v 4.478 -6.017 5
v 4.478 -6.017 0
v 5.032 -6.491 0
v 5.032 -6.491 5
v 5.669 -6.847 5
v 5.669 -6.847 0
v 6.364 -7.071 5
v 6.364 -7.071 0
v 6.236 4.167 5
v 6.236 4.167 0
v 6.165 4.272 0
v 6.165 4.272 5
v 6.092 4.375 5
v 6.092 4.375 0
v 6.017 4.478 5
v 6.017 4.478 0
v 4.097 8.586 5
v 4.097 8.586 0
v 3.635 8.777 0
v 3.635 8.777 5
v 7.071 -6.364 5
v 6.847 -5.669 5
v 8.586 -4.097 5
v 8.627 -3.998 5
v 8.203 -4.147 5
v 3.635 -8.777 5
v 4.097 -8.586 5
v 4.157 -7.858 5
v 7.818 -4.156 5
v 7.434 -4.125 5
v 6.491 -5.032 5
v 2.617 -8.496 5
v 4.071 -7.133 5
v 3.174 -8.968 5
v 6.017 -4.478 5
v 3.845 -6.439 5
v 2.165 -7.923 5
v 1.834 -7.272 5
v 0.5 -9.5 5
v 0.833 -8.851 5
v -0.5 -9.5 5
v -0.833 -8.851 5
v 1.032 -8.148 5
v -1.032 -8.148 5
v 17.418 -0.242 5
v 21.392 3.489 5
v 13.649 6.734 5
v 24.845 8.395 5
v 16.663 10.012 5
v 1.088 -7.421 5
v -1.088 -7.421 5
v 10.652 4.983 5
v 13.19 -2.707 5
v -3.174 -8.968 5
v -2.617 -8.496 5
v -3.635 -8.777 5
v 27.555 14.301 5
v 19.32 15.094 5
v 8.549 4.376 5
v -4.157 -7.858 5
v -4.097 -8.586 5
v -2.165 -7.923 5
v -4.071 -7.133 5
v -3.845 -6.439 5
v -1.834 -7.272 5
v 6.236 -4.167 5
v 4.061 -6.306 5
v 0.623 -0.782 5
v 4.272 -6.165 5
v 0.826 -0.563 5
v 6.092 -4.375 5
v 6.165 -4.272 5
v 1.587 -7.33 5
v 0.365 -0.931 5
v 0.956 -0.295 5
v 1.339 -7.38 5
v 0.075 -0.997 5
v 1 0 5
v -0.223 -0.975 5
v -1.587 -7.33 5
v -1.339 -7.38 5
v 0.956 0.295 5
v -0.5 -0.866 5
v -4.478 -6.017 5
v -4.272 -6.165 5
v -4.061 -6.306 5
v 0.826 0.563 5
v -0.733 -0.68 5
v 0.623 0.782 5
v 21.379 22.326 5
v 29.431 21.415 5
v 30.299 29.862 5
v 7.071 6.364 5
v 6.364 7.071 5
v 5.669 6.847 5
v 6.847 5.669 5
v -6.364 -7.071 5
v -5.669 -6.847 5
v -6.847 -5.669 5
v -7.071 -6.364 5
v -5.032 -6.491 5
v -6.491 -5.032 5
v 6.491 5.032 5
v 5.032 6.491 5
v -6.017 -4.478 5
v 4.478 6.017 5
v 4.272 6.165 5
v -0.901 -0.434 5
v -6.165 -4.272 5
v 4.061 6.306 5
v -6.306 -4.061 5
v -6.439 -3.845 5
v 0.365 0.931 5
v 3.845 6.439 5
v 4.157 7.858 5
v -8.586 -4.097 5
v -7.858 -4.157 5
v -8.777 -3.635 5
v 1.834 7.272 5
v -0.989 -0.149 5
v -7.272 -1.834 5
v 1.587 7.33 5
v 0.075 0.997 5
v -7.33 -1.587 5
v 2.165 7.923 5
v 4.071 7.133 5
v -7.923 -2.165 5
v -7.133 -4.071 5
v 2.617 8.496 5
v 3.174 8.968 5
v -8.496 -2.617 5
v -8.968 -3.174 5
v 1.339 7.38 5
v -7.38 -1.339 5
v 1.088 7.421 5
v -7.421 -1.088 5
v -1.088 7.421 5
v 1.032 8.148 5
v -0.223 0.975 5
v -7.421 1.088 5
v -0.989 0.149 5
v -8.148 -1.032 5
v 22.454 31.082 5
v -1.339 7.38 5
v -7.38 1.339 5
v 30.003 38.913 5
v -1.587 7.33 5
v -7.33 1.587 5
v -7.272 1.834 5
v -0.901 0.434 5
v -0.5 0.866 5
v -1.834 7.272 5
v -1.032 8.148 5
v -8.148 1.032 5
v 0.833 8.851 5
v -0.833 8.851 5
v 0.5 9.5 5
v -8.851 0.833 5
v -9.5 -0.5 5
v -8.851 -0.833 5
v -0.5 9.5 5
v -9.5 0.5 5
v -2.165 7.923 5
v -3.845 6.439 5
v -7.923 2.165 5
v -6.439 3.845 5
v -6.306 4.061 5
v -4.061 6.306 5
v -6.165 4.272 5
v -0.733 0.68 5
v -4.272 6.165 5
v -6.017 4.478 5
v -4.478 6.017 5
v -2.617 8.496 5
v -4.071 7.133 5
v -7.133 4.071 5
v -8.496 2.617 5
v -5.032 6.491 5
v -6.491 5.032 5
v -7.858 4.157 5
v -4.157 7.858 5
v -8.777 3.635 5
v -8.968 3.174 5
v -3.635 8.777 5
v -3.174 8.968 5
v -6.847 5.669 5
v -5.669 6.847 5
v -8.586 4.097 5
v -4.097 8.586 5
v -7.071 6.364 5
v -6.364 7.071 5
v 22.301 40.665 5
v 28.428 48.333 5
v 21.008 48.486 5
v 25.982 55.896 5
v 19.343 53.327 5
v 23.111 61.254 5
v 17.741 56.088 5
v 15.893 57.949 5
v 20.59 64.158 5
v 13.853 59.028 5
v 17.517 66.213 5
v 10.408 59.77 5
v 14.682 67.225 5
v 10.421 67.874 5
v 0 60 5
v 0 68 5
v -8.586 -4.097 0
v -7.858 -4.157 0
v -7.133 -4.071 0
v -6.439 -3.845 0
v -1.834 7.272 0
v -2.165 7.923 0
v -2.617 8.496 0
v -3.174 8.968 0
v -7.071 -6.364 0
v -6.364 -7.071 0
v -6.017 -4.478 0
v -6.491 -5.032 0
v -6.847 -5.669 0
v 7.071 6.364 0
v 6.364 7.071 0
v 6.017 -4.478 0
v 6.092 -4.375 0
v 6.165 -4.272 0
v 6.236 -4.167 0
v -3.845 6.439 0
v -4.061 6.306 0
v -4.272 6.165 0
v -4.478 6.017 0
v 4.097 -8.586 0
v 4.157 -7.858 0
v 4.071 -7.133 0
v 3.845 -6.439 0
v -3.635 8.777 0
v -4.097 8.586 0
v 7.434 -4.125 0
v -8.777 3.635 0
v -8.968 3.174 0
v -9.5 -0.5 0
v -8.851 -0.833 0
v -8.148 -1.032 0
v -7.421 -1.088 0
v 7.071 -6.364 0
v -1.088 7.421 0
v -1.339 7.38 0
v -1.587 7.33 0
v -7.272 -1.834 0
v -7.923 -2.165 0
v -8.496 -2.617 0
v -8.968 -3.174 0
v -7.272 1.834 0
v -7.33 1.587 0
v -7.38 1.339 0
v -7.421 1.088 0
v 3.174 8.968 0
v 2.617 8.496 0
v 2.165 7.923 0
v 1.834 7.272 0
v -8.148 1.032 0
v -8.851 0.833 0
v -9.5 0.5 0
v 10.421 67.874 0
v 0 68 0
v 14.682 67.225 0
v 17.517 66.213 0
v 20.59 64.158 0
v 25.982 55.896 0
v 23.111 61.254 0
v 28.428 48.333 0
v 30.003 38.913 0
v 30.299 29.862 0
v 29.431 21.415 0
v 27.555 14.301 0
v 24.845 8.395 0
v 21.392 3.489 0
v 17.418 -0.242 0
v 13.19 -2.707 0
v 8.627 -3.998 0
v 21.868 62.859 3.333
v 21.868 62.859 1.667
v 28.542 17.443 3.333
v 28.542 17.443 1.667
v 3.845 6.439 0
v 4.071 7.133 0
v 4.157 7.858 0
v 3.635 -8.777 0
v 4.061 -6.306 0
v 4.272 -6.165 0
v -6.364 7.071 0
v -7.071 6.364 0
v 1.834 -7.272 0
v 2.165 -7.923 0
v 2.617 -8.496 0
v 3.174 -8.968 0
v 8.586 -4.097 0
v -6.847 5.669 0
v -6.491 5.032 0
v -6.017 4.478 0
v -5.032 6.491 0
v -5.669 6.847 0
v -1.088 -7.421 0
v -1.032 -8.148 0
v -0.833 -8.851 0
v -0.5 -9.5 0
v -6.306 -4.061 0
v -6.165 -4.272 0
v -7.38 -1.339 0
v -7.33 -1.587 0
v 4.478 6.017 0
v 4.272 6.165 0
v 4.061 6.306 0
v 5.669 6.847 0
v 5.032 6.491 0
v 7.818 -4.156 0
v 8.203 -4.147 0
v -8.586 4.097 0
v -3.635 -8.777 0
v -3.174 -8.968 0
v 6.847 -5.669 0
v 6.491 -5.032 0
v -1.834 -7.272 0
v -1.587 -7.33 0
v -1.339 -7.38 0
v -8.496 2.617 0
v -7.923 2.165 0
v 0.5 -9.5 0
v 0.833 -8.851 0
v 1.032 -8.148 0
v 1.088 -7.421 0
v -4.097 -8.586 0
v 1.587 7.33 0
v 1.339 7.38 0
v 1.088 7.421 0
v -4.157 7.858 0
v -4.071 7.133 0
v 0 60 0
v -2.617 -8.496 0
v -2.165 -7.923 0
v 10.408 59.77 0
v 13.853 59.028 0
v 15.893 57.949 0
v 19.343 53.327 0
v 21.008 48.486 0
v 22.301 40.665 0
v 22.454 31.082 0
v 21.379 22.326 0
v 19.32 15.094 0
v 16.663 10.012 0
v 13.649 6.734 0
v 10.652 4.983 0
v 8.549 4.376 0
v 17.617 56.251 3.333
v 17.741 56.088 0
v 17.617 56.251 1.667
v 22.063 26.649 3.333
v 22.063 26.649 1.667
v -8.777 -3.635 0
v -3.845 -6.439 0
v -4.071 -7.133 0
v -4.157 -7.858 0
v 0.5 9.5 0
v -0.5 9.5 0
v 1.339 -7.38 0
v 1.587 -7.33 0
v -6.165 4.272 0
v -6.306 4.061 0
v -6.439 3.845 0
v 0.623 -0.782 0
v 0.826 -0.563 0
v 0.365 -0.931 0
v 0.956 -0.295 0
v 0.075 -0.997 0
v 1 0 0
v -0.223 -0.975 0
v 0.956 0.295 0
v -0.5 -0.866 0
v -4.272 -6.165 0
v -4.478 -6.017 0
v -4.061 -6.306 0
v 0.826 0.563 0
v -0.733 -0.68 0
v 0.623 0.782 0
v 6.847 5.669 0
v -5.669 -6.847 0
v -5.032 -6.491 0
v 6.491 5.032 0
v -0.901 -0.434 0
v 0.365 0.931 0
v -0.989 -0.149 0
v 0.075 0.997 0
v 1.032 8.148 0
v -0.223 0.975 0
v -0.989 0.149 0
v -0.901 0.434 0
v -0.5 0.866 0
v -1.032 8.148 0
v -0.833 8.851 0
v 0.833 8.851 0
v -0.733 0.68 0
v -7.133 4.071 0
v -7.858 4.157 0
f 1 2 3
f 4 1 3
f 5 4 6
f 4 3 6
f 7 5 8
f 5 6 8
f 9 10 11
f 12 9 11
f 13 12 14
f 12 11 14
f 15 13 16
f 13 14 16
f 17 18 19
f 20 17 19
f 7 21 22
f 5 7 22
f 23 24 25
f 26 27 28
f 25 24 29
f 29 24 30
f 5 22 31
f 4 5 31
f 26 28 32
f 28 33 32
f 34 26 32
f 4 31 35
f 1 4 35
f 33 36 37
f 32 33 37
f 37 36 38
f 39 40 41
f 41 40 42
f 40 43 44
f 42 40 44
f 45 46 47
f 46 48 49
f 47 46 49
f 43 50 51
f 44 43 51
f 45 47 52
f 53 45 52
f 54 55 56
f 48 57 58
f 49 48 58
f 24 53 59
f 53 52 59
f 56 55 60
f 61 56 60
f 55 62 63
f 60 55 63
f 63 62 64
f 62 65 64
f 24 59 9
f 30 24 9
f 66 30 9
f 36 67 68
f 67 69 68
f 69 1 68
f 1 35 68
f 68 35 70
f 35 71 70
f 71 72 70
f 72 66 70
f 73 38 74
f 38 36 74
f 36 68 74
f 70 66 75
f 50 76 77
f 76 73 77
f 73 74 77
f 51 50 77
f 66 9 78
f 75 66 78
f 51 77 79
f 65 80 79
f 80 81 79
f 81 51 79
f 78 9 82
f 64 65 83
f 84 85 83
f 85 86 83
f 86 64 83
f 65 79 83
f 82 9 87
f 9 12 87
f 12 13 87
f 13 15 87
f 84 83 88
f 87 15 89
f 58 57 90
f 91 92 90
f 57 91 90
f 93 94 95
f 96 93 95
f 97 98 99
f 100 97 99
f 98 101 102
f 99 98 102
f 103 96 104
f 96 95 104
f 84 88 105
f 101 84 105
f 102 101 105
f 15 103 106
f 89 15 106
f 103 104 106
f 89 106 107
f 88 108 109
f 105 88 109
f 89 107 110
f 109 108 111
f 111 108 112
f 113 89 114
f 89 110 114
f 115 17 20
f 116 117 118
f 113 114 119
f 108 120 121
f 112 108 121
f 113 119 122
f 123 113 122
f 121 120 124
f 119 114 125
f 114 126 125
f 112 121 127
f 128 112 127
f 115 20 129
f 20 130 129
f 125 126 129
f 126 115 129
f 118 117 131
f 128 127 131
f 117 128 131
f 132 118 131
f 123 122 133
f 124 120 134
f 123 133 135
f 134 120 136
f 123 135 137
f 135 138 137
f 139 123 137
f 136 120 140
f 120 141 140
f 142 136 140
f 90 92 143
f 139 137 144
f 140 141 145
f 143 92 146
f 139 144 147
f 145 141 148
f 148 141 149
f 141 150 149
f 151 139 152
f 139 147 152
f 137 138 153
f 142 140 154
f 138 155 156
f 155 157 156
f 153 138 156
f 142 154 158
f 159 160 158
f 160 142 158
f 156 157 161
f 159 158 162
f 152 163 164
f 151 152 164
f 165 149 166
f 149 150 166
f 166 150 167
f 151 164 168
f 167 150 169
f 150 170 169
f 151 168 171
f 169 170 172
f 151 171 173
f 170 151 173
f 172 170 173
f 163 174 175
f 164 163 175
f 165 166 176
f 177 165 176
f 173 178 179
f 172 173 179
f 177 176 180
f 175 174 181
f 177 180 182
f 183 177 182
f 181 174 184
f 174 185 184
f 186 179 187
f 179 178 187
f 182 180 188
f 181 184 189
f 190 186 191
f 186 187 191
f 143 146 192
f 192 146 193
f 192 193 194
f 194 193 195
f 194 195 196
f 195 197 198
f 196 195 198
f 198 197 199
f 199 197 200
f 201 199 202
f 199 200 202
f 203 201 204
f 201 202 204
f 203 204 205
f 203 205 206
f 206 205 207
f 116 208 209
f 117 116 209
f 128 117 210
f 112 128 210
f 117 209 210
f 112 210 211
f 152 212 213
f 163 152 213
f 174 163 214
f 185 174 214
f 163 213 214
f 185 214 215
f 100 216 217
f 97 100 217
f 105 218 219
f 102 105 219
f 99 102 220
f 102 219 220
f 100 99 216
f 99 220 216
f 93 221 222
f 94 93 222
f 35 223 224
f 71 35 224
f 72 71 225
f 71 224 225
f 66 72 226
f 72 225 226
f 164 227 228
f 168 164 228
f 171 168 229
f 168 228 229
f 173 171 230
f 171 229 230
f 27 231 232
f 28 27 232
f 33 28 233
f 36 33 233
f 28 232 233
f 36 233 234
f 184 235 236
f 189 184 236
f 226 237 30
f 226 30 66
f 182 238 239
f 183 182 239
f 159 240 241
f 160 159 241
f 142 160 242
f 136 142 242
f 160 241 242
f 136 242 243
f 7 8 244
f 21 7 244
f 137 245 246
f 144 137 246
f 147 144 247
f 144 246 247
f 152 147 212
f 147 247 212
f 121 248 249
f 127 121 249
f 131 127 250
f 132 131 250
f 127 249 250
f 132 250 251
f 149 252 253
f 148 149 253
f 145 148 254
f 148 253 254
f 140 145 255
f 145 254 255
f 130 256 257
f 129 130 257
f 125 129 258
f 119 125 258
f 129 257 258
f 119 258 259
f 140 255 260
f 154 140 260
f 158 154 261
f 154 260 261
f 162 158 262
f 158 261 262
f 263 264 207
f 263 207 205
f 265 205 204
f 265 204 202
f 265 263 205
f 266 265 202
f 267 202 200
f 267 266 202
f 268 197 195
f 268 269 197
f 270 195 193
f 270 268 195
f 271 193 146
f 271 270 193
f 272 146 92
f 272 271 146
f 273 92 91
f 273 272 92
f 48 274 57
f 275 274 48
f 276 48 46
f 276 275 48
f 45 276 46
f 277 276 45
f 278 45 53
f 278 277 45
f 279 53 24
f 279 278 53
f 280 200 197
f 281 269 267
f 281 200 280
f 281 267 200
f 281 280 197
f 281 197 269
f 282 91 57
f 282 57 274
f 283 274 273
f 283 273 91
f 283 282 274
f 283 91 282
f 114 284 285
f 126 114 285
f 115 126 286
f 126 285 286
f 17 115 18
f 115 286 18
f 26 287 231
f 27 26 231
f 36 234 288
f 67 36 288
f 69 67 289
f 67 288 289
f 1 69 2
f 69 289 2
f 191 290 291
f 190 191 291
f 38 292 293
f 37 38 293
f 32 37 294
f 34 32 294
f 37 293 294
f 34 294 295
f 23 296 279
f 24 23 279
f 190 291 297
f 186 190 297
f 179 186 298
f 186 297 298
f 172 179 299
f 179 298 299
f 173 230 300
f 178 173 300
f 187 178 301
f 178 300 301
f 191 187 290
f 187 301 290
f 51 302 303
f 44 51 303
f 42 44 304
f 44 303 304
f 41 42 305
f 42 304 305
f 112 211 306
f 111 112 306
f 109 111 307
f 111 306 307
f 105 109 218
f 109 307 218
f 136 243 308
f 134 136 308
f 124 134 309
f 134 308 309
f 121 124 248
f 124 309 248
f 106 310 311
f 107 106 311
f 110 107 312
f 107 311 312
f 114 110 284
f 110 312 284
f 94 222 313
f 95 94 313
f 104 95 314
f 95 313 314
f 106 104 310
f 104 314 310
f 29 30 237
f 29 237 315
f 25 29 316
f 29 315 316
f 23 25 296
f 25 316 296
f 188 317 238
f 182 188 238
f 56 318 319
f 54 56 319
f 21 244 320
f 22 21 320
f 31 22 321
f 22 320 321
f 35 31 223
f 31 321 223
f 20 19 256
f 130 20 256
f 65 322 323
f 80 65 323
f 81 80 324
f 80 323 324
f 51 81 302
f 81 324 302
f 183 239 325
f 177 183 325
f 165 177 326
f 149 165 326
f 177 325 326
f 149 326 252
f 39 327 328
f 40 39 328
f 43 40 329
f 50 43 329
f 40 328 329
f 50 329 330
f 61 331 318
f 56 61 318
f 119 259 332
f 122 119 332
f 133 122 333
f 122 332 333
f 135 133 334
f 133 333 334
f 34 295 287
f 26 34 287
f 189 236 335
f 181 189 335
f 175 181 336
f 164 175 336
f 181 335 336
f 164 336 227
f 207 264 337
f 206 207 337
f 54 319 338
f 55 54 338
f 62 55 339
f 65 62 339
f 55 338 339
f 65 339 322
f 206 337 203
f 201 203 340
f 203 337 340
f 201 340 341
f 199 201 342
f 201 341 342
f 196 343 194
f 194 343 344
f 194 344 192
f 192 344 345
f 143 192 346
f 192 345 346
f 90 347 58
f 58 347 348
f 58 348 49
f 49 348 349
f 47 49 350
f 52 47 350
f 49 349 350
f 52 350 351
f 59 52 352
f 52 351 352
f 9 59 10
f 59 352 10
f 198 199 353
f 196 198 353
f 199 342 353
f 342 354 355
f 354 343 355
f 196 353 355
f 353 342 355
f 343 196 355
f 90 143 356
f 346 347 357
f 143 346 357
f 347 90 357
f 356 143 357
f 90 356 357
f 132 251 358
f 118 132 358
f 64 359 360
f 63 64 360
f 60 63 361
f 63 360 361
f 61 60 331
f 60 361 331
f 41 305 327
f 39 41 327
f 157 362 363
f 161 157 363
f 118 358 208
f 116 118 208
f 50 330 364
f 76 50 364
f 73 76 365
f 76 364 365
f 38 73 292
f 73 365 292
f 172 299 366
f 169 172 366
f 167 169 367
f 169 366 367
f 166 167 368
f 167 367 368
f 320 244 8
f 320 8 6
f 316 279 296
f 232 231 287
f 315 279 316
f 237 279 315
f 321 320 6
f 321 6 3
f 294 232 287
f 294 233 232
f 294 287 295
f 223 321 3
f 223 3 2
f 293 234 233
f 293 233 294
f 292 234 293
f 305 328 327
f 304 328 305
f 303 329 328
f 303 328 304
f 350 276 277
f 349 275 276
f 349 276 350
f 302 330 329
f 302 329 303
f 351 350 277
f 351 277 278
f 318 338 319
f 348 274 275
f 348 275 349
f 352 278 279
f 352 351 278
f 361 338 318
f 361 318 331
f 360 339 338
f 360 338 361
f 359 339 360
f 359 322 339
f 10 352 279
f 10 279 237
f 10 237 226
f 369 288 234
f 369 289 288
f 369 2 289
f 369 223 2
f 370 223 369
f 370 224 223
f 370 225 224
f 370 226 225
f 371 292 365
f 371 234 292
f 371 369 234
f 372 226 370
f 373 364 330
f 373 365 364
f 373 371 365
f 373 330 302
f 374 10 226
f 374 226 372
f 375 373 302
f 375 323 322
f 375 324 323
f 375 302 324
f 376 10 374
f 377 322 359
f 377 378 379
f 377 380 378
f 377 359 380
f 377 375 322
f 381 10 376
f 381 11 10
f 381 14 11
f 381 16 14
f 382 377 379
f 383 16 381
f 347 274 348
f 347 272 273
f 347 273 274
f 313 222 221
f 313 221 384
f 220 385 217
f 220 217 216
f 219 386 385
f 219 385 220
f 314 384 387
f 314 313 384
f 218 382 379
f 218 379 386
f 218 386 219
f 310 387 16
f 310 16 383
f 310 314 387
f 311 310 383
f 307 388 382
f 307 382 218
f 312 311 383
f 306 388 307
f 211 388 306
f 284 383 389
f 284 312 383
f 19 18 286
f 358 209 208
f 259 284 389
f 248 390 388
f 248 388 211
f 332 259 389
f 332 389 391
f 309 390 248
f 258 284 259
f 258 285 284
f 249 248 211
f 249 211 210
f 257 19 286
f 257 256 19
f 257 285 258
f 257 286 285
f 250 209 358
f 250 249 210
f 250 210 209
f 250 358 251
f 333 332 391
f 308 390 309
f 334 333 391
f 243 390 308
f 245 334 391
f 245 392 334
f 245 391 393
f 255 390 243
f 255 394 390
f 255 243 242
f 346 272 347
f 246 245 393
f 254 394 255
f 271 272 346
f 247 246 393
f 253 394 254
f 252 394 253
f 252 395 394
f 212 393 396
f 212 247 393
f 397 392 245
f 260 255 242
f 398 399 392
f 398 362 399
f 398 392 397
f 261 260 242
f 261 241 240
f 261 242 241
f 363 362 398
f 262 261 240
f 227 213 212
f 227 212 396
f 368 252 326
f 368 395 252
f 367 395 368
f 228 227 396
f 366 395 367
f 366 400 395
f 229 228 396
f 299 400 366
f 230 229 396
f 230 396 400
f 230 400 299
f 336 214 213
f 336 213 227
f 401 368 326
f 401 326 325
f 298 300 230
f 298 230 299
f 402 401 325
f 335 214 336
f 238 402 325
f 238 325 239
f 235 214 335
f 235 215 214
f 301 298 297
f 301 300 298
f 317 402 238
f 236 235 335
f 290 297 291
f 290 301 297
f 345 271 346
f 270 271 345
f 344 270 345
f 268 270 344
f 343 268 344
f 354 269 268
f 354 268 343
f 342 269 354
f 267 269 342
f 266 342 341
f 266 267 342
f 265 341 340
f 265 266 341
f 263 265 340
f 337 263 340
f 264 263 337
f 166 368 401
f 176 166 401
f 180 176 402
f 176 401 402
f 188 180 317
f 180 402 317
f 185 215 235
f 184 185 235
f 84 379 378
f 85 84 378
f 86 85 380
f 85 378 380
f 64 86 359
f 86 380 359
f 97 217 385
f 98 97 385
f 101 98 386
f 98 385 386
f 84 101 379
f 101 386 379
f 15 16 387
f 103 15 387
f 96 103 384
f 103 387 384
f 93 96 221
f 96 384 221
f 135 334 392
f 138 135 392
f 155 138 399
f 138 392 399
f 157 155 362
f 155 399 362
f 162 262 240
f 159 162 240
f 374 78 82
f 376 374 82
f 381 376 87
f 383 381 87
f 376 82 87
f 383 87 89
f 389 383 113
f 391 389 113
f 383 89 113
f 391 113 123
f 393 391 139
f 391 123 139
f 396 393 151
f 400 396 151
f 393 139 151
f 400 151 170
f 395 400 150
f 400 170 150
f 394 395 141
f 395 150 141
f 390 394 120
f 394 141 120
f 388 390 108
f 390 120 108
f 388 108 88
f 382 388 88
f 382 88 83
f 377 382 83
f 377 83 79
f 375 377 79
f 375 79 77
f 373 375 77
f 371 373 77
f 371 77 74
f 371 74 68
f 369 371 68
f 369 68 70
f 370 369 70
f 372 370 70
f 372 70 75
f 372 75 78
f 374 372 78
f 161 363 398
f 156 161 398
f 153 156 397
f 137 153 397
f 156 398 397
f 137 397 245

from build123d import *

# Parameters (mm, degrees)
F1_DEPTH = 5
F2_R     = 1
F3_DEPTH = 5.001
F5_DEPTH = 5


with BuildPart() as f1:
    # F0 (on Top) → F1 (new body)
    with BuildSketch(Plane.XY):
        with BuildLine():
            ThreePointArc((7.4206173165, -1.0883191822), (7.4801280027, -0.5456052265), (7.5, 0))
            ThreePointArc((7.5, 0), (7.4801280027, 0.5456052265), (7.4206173165, 1.0883191822))
            ThreePointArc((7.4206173165, 1.0883191822), (7.355889603, 1.4631774151), (7.2722381774, 1.8342714877))
            ThreePointArc((7.2722381774, 1.8342714877), (6.9290964938, 2.8701257427), (6.4392747372, 3.8452231222))
            ThreePointArc((6.4392747372, 3.8452231222), (6.2360220923, 4.1667767476), (6.0167266989, 4.4776109513))
            ThreePointArc((6.0167266989, 4.4776109513), (5.3033008589, 5.3033008589), (4.4776109513, 6.0167266989))
            ThreePointArc((4.4776109513, 6.0167266989), (4.1667767476, 6.2360220923), (3.8452231222, 6.4392747372))
            ThreePointArc((3.8452231222, 6.4392747372), (2.8701257427, 6.9290964938), (1.8342714877, 7.2722381774))
            ThreePointArc((1.8342714877, 7.2722381774), (1.4631774151, 7.355889603), (1.0883191822, 7.4206173165))
            ThreePointArc((1.0883191822, 7.4206173165), (0, 7.5), (-1.0883191822, 7.4206173165))
            ThreePointArc((-1.0883191822, 7.4206173165), (-1.4631774151, 7.355889603), (-1.8342714877, 7.2722381774))
            ThreePointArc((-1.8342714877, 7.2722381774), (-2.8701257427, 6.9290964938), (-3.8452231222, 6.4392747372))
            ThreePointArc((-3.8452231222, 6.4392747372), (-4.1667767476, 6.2360220923), (-4.4776109513, 6.0167266989))
            ThreePointArc((-4.4776109513, 6.0167266989), (-5.3033008589, 5.3033008589), (-6.0167266989, 4.4776109513))
            ThreePointArc((-6.0167266989, 4.4776109513), (-6.2360220923, 4.1667767476), (-6.4392747372, 3.8452231222))
            ThreePointArc((-6.4392747372, 3.8452231222), (-6.9290964938, 2.8701257427), (-7.2722381774, 1.8342714877))
            ThreePointArc((-7.2722381774, 1.8342714877), (-7.355889603, 1.4631774151), (-7.4206173165, 1.0883191822))
            ThreePointArc((-7.4206173165, 1.0883191822), (-7.5, 0), (-7.4206173165, -1.0883191822))
            ThreePointArc((-7.4206173165, -1.0883191822), (-7.355889603, -1.4631774151), (-7.2722381774, -1.8342714877))
            ThreePointArc((-7.2722381774, -1.8342714877), (-6.9290964938, -2.8701257427), (-6.4392747372, -3.8452231222))
            ThreePointArc((-6.4392747372, -3.8452231222), (-6.2360220923, -4.1667767476), (-6.0167266989, -4.4776109513))
            ThreePointArc((-6.0167266989, -4.4776109513), (-5.3033008589, -5.3033008589), (-4.4776109513, -6.0167266989))
            ThreePointArc((-4.4776109513, -6.0167266989), (-4.1667767476, -6.2360220923), (-3.8452231222, -6.4392747372))
            ThreePointArc((-3.8452231222, -6.4392747372), (-2.8701257427, -6.9290964938), (-1.8342714877, -7.2722381774))
            ThreePointArc((-1.8342714877, -7.2722381774), (-1.4631774151, -7.355889603), (-1.0883191822, -7.4206173165))
            ThreePointArc((-1.0883191822, -7.4206173165), (0, -7.5), (1.0883191822, -7.4206173165))
            ThreePointArc((1.0883191822, -7.4206173165), (1.4631774151, -7.355889603), (1.8342714877, -7.2722381774))
            ThreePointArc((1.8342714877, -7.2722381774), (2.8701257427, -6.9290964938), (3.8452231222, -6.4392747372))
            ThreePointArc((3.8452231222, -6.4392747372), (4.1667767476, -6.2360220923), (4.4776109513, -6.0167266989))
            ThreePointArc((4.4776109513, -6.0167266989), (5.3033008589, -5.3033008589), (6.0167266989, -4.4776109513))
            ThreePointArc((6.0167266989, -4.4776109513), (6.2360220923, -4.1667767476), (6.4392747372, -3.8452231222))
            ThreePointArc((6.4392747372, -3.8452231222), (6.9290964938, -2.8701257427), (7.2722381774, -1.8342714877))
            ThreePointArc((7.2722381774, -1.8342714877), (7.355889603, -1.4631774151), (7.4206173165, -1.0883191822))
        make_face()
        with BuildLine():
            ThreePointArc((7.4206173165, 1.0883191822), (7.4801280027, 0.5456052265), (7.5, 0))
            ThreePointArc((7.5, 0), (7.4801280027, -0.5456052265), (7.4206173165, -1.0883191822))
            ThreePointArc((7.4206173165, -1.0883191822), (8.5043518229, -0.9498278009), (9.5, -0.5))
            Line((9.5, -0.5), (9.5, 0))
            Line((9.5, 0), (9.5, 0.5))
            ThreePointArc((9.5, 0.5), (8.5043518229, 0.9498278009), (7.4206173165, 1.0883191822))
        make_face()
        with BuildLine():
            ThreePointArc((6.4392747372, 3.8452231222), (6.9290964938, 2.8701257427), (7.2722381774, 1.8342714877))
            ThreePointArc((7.2722381774, 1.8342714877), (8.2204799494, 2.376948081), (8.968197275, 3.1735528412))
            Line((8.968197275, 3.1735528412), (8.7768555589, 3.6354926075))
            Line((8.7768555589, 3.6354926075), (8.5855138427, 4.0974323737))
            ThreePointArc((8.5855138427, 4.0974323737), (7.4935132234, 4.1320010103), (6.4392747372, 3.8452231222))
        make_face()
        with BuildLine():
            ThreePointArc((8.968197275, -3.1735528412), (8.2204799494, -2.376948081), (7.2722381774, -1.8342714877))
            ThreePointArc((7.2722381774, -1.8342714877), (6.9290964938, -2.8701257427), (6.4392747372, -3.8452231222))
            ThreePointArc((6.4392747372, -3.8452231222), (7.4935132234, -4.1320010103), (8.5855138427, -4.0974323737))
            Line((8.5855138427, -4.0974323737), (8.7768555589, -3.6354926075))
            Line((8.7768555589, -3.6354926075), (8.968197275, -3.1735528412))
        make_face()
        with BuildLine():
            ThreePointArc((4.4776109513, 6.0167266989), (5.3033008589, 5.3033008589), (6.0167266989, 4.4776109513))
            ThreePointArc((6.0167266989, 4.4776109513), (6.6851145225, 5.3418551646), (7.0710678119, 6.3639610307))
            Line((7.0710678119, 6.3639610307), (6.7175144213, 6.7175144213))
            Line((6.7175144213, 6.7175144213), (6.3639610307, 7.0710678119))
            ThreePointArc((6.3639610307, 7.0710678119), (5.3418551646, 6.6851145225), (4.4776109513, 6.0167266989))
        make_face()
        with BuildLine():
            ThreePointArc((7.0710678119, -6.3639610307), (6.6851145225, -5.3418551646), (6.0167266989, -4.4776109513))
            ThreePointArc((6.0167266989, -4.4776109513), (5.3033008589, -5.3033008589), (4.4776109513, -6.0167266989))
            ThreePointArc((4.4776109513, -6.0167266989), (5.3418551646, -6.6851145225), (6.3639610307, -7.0710678119))
            Line((6.3639610307, -7.0710678119), (6.7175144213, -6.7175144213))
            Line((6.7175144213, -6.7175144213), (7.0710678119, -6.3639610307))
        make_face()
        with BuildLine():
            ThreePointArc((1.8342714877, 7.2722381774), (2.8701257427, 6.9290964938), (3.8452231222, 6.4392747372))
            ThreePointArc((3.8452231222, 6.4392747372), (4.1320010103, 7.4935132234), (4.0974323737, 8.5855138427))
            Line((4.0974323737, 8.5855138427), (3.6354926075, 8.7768555589))
            Line((3.6354926075, 8.7768555589), (3.1735528412, 8.968197275))
            ThreePointArc((3.1735528412, 8.968197275), (2.376948081, 8.2204799494), (1.8342714877, 7.2722381774))
        make_face()
        with BuildLine():
            ThreePointArc((4.0974323737, -8.5855138427), (4.1320010103, -7.4935132234), (3.8452231222, -6.4392747372))
            ThreePointArc((3.8452231222, -6.4392747372), (2.8701257427, -6.9290964938), (1.8342714877, -7.2722381774))
            ThreePointArc((1.8342714877, -7.2722381774), (2.376948081, -8.2204799494), (3.1735528412, -8.968197275))
            Line((3.1735528412, -8.968197275), (3.6354926075, -8.7768555589))
            Line((3.6354926075, -8.7768555589), (4.0974323737, -8.5855138427))
        make_face()
        with BuildLine():
            ThreePointArc((-1.0883191822, 7.4206173165), (0, 7.5), (1.0883191822, 7.4206173165))
            ThreePointArc((1.0883191822, 7.4206173165), (0.9498278009, 8.5043518229), (0.5, 9.5))
            Line((0.5, 9.5), (0, 9.5))
            Line((0, 9.5), (-0.5, 9.5))
            ThreePointArc((-0.5, 9.5), (-0.9498278009, 8.5043518229), (-1.0883191822, 7.4206173165))
        make_face()
        with BuildLine():
            ThreePointArc((0.5, -9.5), (0.9498278009, -8.5043518229), (1.0883191822, -7.4206173165))
            ThreePointArc((1.0883191822, -7.4206173165), (0, -7.5), (-1.0883191822, -7.4206173165))
            ThreePointArc((-1.0883191822, -7.4206173165), (-0.9498278009, -8.5043518229), (-0.5, -9.5))
            Line((-0.5, -9.5), (0, -9.5))
            Line((0, -9.5), (0.5, -9.5))
        make_face()
        with BuildLine():
            ThreePointArc((-3.8452231222, 6.4392747372), (-2.8701257427, 6.9290964938), (-1.8342714877, 7.2722381774))
            ThreePointArc((-1.8342714877, 7.2722381774), (-2.376948081, 8.2204799494), (-3.1735528412, 8.968197275))
            Line((-3.1735528412, 8.968197275), (-3.6354926075, 8.7768555589))
            Line((-3.6354926075, 8.7768555589), (-4.0974323737, 8.5855138427))
            ThreePointArc((-4.0974323737, 8.5855138427), (-4.1320010103, 7.4935132234), (-3.8452231222, 6.4392747372))
        make_face()
        with BuildLine():
            ThreePointArc((-3.1735528412, -8.968197275), (-2.376948081, -8.2204799494), (-1.8342714877, -7.2722381774))
            ThreePointArc((-1.8342714877, -7.2722381774), (-2.8701257427, -6.9290964938), (-3.8452231222, -6.4392747372))
            ThreePointArc((-3.8452231222, -6.4392747372), (-4.1320010103, -7.4935132234), (-4.0974323737, -8.5855138427))
            Line((-4.0974323737, -8.5855138427), (-3.6354926075, -8.7768555589))
            Line((-3.6354926075, -8.7768555589), (-3.1735528412, -8.968197275))
        make_face()
        with BuildLine():
            ThreePointArc((-6.0167266989, 4.4776109513), (-5.3033008589, 5.3033008589), (-4.4776109513, 6.0167266989))
            ThreePointArc((-4.4776109513, 6.0167266989), (-5.3418551646, 6.6851145225), (-6.3639610307, 7.0710678119))
            Line((-6.3639610307, 7.0710678119), (-6.7175144213, 6.7175144213))
            Line((-6.7175144213, 6.7175144213), (-7.0710678119, 6.3639610307))
            ThreePointArc((-7.0710678119, 6.3639610307), (-6.6851145225, 5.3418551646), (-6.0167266989, 4.4776109513))
        make_face()
        with BuildLine():
            ThreePointArc((-6.3639610307, -7.0710678119), (-5.3418551646, -6.6851145225), (-4.4776109513, -6.0167266989))
            ThreePointArc((-4.4776109513, -6.0167266989), (-5.3033008589, -5.3033008589), (-6.0167266989, -4.4776109513))
            ThreePointArc((-6.0167266989, -4.4776109513), (-6.6851145225, -5.3418551646), (-7.0710678119, -6.3639610307))
            Line((-7.0710678119, -6.3639610307), (-6.7175144213, -6.7175144213))
            Line((-6.7175144213, -6.7175144213), (-6.3639610307, -7.0710678119))
        make_face()
        with BuildLine():
            ThreePointArc((-7.2722381774, 1.8342714877), (-6.9290964938, 2.8701257427), (-6.4392747372, 3.8452231222))
            ThreePointArc((-6.4392747372, 3.8452231222), (-7.4935132234, 4.1320010103), (-8.5855138427, 4.0974323737))
            Line((-8.5855138427, 4.0974323737), (-8.7768555589, 3.6354926075))
            Line((-8.7768555589, 3.6354926075), (-8.968197275, 3.1735528412))
            ThreePointArc((-8.968197275, 3.1735528412), (-8.2204799494, 2.376948081), (-7.2722381774, 1.8342714877))
        make_face()
        with BuildLine():
            ThreePointArc((-8.5855138427, -4.0974323737), (-7.4935132234, -4.1320010103), (-6.4392747372, -3.8452231222))
            ThreePointArc((-6.4392747372, -3.8452231222), (-6.9290964938, -2.8701257427), (-7.2722381774, -1.8342714877))
            ThreePointArc((-7.2722381774, -1.8342714877), (-8.2204799494, -2.376948081), (-8.968197275, -3.1735528412))
            Line((-8.968197275, -3.1735528412), (-8.7768555589, -3.6354926075))
            Line((-8.7768555589, -3.6354926075), (-8.5855138427, -4.0974323737))
        make_face()
        with BuildLine():
            ThreePointArc((-7.4206173165, -1.0883191822), (-7.5, 0), (-7.4206173165, 1.0883191822))
            ThreePointArc((-7.4206173165, 1.0883191822), (-8.5043518229, 0.9498278009), (-9.5, 0.5))
            Line((-9.5, 0.5), (-9.5, 0))
            Line((-9.5, 0), (-9.5, -0.5))
            ThreePointArc((-9.5, -0.5), (-8.5043518229, -0.9498278009), (-7.4206173165, -1.0883191822))
        make_face()
    extrude(amount=F1_DEPTH)

    # F2 (on face) → F3 (cut, through all)
    with BuildSketch(Plane.XY.offset(5)):
        Circle(F2_R)
    extrude(amount=-F3_DEPTH, mode=Mode.SUBTRACT)

    # F4 (on Top) → F5 (join, through all)
    with BuildSketch(Plane.XY):
        with BuildLine():
            add(Edge.make_bspline(
                [(0, 68), (10, 68), (26.5357793377, 69.6195584207), (35.7921763751, 15.3144879989), (16.2360220923, -4.1667767476), (6.2360220923, -4.1667767476)],
                knots=[0, 0, 0, 0, 0.2773691883, 0.6738677823, 1, 1, 1, 1], degree=3))
            Line((0, 68), (0, 60))
            add(Edge.make_bspline(
                [(0, 60), (10, 60), (20.2377735158, 60.6776605511), (25.2912821546, 26.6920800115), (16.2360220923, 4.1667767476), (6.2360220923, 4.1667767476)],
                knots=[0, 0, 0, 0, 0.28371621, 0.6494672366, 1, 1, 1, 1], degree=3))
            Line((6.2360220923, 4.1667767476), (6.2360220923, -4.1667767476))
        make_face()
    extrude(amount=F5_DEPTH)


solid = f1.part
